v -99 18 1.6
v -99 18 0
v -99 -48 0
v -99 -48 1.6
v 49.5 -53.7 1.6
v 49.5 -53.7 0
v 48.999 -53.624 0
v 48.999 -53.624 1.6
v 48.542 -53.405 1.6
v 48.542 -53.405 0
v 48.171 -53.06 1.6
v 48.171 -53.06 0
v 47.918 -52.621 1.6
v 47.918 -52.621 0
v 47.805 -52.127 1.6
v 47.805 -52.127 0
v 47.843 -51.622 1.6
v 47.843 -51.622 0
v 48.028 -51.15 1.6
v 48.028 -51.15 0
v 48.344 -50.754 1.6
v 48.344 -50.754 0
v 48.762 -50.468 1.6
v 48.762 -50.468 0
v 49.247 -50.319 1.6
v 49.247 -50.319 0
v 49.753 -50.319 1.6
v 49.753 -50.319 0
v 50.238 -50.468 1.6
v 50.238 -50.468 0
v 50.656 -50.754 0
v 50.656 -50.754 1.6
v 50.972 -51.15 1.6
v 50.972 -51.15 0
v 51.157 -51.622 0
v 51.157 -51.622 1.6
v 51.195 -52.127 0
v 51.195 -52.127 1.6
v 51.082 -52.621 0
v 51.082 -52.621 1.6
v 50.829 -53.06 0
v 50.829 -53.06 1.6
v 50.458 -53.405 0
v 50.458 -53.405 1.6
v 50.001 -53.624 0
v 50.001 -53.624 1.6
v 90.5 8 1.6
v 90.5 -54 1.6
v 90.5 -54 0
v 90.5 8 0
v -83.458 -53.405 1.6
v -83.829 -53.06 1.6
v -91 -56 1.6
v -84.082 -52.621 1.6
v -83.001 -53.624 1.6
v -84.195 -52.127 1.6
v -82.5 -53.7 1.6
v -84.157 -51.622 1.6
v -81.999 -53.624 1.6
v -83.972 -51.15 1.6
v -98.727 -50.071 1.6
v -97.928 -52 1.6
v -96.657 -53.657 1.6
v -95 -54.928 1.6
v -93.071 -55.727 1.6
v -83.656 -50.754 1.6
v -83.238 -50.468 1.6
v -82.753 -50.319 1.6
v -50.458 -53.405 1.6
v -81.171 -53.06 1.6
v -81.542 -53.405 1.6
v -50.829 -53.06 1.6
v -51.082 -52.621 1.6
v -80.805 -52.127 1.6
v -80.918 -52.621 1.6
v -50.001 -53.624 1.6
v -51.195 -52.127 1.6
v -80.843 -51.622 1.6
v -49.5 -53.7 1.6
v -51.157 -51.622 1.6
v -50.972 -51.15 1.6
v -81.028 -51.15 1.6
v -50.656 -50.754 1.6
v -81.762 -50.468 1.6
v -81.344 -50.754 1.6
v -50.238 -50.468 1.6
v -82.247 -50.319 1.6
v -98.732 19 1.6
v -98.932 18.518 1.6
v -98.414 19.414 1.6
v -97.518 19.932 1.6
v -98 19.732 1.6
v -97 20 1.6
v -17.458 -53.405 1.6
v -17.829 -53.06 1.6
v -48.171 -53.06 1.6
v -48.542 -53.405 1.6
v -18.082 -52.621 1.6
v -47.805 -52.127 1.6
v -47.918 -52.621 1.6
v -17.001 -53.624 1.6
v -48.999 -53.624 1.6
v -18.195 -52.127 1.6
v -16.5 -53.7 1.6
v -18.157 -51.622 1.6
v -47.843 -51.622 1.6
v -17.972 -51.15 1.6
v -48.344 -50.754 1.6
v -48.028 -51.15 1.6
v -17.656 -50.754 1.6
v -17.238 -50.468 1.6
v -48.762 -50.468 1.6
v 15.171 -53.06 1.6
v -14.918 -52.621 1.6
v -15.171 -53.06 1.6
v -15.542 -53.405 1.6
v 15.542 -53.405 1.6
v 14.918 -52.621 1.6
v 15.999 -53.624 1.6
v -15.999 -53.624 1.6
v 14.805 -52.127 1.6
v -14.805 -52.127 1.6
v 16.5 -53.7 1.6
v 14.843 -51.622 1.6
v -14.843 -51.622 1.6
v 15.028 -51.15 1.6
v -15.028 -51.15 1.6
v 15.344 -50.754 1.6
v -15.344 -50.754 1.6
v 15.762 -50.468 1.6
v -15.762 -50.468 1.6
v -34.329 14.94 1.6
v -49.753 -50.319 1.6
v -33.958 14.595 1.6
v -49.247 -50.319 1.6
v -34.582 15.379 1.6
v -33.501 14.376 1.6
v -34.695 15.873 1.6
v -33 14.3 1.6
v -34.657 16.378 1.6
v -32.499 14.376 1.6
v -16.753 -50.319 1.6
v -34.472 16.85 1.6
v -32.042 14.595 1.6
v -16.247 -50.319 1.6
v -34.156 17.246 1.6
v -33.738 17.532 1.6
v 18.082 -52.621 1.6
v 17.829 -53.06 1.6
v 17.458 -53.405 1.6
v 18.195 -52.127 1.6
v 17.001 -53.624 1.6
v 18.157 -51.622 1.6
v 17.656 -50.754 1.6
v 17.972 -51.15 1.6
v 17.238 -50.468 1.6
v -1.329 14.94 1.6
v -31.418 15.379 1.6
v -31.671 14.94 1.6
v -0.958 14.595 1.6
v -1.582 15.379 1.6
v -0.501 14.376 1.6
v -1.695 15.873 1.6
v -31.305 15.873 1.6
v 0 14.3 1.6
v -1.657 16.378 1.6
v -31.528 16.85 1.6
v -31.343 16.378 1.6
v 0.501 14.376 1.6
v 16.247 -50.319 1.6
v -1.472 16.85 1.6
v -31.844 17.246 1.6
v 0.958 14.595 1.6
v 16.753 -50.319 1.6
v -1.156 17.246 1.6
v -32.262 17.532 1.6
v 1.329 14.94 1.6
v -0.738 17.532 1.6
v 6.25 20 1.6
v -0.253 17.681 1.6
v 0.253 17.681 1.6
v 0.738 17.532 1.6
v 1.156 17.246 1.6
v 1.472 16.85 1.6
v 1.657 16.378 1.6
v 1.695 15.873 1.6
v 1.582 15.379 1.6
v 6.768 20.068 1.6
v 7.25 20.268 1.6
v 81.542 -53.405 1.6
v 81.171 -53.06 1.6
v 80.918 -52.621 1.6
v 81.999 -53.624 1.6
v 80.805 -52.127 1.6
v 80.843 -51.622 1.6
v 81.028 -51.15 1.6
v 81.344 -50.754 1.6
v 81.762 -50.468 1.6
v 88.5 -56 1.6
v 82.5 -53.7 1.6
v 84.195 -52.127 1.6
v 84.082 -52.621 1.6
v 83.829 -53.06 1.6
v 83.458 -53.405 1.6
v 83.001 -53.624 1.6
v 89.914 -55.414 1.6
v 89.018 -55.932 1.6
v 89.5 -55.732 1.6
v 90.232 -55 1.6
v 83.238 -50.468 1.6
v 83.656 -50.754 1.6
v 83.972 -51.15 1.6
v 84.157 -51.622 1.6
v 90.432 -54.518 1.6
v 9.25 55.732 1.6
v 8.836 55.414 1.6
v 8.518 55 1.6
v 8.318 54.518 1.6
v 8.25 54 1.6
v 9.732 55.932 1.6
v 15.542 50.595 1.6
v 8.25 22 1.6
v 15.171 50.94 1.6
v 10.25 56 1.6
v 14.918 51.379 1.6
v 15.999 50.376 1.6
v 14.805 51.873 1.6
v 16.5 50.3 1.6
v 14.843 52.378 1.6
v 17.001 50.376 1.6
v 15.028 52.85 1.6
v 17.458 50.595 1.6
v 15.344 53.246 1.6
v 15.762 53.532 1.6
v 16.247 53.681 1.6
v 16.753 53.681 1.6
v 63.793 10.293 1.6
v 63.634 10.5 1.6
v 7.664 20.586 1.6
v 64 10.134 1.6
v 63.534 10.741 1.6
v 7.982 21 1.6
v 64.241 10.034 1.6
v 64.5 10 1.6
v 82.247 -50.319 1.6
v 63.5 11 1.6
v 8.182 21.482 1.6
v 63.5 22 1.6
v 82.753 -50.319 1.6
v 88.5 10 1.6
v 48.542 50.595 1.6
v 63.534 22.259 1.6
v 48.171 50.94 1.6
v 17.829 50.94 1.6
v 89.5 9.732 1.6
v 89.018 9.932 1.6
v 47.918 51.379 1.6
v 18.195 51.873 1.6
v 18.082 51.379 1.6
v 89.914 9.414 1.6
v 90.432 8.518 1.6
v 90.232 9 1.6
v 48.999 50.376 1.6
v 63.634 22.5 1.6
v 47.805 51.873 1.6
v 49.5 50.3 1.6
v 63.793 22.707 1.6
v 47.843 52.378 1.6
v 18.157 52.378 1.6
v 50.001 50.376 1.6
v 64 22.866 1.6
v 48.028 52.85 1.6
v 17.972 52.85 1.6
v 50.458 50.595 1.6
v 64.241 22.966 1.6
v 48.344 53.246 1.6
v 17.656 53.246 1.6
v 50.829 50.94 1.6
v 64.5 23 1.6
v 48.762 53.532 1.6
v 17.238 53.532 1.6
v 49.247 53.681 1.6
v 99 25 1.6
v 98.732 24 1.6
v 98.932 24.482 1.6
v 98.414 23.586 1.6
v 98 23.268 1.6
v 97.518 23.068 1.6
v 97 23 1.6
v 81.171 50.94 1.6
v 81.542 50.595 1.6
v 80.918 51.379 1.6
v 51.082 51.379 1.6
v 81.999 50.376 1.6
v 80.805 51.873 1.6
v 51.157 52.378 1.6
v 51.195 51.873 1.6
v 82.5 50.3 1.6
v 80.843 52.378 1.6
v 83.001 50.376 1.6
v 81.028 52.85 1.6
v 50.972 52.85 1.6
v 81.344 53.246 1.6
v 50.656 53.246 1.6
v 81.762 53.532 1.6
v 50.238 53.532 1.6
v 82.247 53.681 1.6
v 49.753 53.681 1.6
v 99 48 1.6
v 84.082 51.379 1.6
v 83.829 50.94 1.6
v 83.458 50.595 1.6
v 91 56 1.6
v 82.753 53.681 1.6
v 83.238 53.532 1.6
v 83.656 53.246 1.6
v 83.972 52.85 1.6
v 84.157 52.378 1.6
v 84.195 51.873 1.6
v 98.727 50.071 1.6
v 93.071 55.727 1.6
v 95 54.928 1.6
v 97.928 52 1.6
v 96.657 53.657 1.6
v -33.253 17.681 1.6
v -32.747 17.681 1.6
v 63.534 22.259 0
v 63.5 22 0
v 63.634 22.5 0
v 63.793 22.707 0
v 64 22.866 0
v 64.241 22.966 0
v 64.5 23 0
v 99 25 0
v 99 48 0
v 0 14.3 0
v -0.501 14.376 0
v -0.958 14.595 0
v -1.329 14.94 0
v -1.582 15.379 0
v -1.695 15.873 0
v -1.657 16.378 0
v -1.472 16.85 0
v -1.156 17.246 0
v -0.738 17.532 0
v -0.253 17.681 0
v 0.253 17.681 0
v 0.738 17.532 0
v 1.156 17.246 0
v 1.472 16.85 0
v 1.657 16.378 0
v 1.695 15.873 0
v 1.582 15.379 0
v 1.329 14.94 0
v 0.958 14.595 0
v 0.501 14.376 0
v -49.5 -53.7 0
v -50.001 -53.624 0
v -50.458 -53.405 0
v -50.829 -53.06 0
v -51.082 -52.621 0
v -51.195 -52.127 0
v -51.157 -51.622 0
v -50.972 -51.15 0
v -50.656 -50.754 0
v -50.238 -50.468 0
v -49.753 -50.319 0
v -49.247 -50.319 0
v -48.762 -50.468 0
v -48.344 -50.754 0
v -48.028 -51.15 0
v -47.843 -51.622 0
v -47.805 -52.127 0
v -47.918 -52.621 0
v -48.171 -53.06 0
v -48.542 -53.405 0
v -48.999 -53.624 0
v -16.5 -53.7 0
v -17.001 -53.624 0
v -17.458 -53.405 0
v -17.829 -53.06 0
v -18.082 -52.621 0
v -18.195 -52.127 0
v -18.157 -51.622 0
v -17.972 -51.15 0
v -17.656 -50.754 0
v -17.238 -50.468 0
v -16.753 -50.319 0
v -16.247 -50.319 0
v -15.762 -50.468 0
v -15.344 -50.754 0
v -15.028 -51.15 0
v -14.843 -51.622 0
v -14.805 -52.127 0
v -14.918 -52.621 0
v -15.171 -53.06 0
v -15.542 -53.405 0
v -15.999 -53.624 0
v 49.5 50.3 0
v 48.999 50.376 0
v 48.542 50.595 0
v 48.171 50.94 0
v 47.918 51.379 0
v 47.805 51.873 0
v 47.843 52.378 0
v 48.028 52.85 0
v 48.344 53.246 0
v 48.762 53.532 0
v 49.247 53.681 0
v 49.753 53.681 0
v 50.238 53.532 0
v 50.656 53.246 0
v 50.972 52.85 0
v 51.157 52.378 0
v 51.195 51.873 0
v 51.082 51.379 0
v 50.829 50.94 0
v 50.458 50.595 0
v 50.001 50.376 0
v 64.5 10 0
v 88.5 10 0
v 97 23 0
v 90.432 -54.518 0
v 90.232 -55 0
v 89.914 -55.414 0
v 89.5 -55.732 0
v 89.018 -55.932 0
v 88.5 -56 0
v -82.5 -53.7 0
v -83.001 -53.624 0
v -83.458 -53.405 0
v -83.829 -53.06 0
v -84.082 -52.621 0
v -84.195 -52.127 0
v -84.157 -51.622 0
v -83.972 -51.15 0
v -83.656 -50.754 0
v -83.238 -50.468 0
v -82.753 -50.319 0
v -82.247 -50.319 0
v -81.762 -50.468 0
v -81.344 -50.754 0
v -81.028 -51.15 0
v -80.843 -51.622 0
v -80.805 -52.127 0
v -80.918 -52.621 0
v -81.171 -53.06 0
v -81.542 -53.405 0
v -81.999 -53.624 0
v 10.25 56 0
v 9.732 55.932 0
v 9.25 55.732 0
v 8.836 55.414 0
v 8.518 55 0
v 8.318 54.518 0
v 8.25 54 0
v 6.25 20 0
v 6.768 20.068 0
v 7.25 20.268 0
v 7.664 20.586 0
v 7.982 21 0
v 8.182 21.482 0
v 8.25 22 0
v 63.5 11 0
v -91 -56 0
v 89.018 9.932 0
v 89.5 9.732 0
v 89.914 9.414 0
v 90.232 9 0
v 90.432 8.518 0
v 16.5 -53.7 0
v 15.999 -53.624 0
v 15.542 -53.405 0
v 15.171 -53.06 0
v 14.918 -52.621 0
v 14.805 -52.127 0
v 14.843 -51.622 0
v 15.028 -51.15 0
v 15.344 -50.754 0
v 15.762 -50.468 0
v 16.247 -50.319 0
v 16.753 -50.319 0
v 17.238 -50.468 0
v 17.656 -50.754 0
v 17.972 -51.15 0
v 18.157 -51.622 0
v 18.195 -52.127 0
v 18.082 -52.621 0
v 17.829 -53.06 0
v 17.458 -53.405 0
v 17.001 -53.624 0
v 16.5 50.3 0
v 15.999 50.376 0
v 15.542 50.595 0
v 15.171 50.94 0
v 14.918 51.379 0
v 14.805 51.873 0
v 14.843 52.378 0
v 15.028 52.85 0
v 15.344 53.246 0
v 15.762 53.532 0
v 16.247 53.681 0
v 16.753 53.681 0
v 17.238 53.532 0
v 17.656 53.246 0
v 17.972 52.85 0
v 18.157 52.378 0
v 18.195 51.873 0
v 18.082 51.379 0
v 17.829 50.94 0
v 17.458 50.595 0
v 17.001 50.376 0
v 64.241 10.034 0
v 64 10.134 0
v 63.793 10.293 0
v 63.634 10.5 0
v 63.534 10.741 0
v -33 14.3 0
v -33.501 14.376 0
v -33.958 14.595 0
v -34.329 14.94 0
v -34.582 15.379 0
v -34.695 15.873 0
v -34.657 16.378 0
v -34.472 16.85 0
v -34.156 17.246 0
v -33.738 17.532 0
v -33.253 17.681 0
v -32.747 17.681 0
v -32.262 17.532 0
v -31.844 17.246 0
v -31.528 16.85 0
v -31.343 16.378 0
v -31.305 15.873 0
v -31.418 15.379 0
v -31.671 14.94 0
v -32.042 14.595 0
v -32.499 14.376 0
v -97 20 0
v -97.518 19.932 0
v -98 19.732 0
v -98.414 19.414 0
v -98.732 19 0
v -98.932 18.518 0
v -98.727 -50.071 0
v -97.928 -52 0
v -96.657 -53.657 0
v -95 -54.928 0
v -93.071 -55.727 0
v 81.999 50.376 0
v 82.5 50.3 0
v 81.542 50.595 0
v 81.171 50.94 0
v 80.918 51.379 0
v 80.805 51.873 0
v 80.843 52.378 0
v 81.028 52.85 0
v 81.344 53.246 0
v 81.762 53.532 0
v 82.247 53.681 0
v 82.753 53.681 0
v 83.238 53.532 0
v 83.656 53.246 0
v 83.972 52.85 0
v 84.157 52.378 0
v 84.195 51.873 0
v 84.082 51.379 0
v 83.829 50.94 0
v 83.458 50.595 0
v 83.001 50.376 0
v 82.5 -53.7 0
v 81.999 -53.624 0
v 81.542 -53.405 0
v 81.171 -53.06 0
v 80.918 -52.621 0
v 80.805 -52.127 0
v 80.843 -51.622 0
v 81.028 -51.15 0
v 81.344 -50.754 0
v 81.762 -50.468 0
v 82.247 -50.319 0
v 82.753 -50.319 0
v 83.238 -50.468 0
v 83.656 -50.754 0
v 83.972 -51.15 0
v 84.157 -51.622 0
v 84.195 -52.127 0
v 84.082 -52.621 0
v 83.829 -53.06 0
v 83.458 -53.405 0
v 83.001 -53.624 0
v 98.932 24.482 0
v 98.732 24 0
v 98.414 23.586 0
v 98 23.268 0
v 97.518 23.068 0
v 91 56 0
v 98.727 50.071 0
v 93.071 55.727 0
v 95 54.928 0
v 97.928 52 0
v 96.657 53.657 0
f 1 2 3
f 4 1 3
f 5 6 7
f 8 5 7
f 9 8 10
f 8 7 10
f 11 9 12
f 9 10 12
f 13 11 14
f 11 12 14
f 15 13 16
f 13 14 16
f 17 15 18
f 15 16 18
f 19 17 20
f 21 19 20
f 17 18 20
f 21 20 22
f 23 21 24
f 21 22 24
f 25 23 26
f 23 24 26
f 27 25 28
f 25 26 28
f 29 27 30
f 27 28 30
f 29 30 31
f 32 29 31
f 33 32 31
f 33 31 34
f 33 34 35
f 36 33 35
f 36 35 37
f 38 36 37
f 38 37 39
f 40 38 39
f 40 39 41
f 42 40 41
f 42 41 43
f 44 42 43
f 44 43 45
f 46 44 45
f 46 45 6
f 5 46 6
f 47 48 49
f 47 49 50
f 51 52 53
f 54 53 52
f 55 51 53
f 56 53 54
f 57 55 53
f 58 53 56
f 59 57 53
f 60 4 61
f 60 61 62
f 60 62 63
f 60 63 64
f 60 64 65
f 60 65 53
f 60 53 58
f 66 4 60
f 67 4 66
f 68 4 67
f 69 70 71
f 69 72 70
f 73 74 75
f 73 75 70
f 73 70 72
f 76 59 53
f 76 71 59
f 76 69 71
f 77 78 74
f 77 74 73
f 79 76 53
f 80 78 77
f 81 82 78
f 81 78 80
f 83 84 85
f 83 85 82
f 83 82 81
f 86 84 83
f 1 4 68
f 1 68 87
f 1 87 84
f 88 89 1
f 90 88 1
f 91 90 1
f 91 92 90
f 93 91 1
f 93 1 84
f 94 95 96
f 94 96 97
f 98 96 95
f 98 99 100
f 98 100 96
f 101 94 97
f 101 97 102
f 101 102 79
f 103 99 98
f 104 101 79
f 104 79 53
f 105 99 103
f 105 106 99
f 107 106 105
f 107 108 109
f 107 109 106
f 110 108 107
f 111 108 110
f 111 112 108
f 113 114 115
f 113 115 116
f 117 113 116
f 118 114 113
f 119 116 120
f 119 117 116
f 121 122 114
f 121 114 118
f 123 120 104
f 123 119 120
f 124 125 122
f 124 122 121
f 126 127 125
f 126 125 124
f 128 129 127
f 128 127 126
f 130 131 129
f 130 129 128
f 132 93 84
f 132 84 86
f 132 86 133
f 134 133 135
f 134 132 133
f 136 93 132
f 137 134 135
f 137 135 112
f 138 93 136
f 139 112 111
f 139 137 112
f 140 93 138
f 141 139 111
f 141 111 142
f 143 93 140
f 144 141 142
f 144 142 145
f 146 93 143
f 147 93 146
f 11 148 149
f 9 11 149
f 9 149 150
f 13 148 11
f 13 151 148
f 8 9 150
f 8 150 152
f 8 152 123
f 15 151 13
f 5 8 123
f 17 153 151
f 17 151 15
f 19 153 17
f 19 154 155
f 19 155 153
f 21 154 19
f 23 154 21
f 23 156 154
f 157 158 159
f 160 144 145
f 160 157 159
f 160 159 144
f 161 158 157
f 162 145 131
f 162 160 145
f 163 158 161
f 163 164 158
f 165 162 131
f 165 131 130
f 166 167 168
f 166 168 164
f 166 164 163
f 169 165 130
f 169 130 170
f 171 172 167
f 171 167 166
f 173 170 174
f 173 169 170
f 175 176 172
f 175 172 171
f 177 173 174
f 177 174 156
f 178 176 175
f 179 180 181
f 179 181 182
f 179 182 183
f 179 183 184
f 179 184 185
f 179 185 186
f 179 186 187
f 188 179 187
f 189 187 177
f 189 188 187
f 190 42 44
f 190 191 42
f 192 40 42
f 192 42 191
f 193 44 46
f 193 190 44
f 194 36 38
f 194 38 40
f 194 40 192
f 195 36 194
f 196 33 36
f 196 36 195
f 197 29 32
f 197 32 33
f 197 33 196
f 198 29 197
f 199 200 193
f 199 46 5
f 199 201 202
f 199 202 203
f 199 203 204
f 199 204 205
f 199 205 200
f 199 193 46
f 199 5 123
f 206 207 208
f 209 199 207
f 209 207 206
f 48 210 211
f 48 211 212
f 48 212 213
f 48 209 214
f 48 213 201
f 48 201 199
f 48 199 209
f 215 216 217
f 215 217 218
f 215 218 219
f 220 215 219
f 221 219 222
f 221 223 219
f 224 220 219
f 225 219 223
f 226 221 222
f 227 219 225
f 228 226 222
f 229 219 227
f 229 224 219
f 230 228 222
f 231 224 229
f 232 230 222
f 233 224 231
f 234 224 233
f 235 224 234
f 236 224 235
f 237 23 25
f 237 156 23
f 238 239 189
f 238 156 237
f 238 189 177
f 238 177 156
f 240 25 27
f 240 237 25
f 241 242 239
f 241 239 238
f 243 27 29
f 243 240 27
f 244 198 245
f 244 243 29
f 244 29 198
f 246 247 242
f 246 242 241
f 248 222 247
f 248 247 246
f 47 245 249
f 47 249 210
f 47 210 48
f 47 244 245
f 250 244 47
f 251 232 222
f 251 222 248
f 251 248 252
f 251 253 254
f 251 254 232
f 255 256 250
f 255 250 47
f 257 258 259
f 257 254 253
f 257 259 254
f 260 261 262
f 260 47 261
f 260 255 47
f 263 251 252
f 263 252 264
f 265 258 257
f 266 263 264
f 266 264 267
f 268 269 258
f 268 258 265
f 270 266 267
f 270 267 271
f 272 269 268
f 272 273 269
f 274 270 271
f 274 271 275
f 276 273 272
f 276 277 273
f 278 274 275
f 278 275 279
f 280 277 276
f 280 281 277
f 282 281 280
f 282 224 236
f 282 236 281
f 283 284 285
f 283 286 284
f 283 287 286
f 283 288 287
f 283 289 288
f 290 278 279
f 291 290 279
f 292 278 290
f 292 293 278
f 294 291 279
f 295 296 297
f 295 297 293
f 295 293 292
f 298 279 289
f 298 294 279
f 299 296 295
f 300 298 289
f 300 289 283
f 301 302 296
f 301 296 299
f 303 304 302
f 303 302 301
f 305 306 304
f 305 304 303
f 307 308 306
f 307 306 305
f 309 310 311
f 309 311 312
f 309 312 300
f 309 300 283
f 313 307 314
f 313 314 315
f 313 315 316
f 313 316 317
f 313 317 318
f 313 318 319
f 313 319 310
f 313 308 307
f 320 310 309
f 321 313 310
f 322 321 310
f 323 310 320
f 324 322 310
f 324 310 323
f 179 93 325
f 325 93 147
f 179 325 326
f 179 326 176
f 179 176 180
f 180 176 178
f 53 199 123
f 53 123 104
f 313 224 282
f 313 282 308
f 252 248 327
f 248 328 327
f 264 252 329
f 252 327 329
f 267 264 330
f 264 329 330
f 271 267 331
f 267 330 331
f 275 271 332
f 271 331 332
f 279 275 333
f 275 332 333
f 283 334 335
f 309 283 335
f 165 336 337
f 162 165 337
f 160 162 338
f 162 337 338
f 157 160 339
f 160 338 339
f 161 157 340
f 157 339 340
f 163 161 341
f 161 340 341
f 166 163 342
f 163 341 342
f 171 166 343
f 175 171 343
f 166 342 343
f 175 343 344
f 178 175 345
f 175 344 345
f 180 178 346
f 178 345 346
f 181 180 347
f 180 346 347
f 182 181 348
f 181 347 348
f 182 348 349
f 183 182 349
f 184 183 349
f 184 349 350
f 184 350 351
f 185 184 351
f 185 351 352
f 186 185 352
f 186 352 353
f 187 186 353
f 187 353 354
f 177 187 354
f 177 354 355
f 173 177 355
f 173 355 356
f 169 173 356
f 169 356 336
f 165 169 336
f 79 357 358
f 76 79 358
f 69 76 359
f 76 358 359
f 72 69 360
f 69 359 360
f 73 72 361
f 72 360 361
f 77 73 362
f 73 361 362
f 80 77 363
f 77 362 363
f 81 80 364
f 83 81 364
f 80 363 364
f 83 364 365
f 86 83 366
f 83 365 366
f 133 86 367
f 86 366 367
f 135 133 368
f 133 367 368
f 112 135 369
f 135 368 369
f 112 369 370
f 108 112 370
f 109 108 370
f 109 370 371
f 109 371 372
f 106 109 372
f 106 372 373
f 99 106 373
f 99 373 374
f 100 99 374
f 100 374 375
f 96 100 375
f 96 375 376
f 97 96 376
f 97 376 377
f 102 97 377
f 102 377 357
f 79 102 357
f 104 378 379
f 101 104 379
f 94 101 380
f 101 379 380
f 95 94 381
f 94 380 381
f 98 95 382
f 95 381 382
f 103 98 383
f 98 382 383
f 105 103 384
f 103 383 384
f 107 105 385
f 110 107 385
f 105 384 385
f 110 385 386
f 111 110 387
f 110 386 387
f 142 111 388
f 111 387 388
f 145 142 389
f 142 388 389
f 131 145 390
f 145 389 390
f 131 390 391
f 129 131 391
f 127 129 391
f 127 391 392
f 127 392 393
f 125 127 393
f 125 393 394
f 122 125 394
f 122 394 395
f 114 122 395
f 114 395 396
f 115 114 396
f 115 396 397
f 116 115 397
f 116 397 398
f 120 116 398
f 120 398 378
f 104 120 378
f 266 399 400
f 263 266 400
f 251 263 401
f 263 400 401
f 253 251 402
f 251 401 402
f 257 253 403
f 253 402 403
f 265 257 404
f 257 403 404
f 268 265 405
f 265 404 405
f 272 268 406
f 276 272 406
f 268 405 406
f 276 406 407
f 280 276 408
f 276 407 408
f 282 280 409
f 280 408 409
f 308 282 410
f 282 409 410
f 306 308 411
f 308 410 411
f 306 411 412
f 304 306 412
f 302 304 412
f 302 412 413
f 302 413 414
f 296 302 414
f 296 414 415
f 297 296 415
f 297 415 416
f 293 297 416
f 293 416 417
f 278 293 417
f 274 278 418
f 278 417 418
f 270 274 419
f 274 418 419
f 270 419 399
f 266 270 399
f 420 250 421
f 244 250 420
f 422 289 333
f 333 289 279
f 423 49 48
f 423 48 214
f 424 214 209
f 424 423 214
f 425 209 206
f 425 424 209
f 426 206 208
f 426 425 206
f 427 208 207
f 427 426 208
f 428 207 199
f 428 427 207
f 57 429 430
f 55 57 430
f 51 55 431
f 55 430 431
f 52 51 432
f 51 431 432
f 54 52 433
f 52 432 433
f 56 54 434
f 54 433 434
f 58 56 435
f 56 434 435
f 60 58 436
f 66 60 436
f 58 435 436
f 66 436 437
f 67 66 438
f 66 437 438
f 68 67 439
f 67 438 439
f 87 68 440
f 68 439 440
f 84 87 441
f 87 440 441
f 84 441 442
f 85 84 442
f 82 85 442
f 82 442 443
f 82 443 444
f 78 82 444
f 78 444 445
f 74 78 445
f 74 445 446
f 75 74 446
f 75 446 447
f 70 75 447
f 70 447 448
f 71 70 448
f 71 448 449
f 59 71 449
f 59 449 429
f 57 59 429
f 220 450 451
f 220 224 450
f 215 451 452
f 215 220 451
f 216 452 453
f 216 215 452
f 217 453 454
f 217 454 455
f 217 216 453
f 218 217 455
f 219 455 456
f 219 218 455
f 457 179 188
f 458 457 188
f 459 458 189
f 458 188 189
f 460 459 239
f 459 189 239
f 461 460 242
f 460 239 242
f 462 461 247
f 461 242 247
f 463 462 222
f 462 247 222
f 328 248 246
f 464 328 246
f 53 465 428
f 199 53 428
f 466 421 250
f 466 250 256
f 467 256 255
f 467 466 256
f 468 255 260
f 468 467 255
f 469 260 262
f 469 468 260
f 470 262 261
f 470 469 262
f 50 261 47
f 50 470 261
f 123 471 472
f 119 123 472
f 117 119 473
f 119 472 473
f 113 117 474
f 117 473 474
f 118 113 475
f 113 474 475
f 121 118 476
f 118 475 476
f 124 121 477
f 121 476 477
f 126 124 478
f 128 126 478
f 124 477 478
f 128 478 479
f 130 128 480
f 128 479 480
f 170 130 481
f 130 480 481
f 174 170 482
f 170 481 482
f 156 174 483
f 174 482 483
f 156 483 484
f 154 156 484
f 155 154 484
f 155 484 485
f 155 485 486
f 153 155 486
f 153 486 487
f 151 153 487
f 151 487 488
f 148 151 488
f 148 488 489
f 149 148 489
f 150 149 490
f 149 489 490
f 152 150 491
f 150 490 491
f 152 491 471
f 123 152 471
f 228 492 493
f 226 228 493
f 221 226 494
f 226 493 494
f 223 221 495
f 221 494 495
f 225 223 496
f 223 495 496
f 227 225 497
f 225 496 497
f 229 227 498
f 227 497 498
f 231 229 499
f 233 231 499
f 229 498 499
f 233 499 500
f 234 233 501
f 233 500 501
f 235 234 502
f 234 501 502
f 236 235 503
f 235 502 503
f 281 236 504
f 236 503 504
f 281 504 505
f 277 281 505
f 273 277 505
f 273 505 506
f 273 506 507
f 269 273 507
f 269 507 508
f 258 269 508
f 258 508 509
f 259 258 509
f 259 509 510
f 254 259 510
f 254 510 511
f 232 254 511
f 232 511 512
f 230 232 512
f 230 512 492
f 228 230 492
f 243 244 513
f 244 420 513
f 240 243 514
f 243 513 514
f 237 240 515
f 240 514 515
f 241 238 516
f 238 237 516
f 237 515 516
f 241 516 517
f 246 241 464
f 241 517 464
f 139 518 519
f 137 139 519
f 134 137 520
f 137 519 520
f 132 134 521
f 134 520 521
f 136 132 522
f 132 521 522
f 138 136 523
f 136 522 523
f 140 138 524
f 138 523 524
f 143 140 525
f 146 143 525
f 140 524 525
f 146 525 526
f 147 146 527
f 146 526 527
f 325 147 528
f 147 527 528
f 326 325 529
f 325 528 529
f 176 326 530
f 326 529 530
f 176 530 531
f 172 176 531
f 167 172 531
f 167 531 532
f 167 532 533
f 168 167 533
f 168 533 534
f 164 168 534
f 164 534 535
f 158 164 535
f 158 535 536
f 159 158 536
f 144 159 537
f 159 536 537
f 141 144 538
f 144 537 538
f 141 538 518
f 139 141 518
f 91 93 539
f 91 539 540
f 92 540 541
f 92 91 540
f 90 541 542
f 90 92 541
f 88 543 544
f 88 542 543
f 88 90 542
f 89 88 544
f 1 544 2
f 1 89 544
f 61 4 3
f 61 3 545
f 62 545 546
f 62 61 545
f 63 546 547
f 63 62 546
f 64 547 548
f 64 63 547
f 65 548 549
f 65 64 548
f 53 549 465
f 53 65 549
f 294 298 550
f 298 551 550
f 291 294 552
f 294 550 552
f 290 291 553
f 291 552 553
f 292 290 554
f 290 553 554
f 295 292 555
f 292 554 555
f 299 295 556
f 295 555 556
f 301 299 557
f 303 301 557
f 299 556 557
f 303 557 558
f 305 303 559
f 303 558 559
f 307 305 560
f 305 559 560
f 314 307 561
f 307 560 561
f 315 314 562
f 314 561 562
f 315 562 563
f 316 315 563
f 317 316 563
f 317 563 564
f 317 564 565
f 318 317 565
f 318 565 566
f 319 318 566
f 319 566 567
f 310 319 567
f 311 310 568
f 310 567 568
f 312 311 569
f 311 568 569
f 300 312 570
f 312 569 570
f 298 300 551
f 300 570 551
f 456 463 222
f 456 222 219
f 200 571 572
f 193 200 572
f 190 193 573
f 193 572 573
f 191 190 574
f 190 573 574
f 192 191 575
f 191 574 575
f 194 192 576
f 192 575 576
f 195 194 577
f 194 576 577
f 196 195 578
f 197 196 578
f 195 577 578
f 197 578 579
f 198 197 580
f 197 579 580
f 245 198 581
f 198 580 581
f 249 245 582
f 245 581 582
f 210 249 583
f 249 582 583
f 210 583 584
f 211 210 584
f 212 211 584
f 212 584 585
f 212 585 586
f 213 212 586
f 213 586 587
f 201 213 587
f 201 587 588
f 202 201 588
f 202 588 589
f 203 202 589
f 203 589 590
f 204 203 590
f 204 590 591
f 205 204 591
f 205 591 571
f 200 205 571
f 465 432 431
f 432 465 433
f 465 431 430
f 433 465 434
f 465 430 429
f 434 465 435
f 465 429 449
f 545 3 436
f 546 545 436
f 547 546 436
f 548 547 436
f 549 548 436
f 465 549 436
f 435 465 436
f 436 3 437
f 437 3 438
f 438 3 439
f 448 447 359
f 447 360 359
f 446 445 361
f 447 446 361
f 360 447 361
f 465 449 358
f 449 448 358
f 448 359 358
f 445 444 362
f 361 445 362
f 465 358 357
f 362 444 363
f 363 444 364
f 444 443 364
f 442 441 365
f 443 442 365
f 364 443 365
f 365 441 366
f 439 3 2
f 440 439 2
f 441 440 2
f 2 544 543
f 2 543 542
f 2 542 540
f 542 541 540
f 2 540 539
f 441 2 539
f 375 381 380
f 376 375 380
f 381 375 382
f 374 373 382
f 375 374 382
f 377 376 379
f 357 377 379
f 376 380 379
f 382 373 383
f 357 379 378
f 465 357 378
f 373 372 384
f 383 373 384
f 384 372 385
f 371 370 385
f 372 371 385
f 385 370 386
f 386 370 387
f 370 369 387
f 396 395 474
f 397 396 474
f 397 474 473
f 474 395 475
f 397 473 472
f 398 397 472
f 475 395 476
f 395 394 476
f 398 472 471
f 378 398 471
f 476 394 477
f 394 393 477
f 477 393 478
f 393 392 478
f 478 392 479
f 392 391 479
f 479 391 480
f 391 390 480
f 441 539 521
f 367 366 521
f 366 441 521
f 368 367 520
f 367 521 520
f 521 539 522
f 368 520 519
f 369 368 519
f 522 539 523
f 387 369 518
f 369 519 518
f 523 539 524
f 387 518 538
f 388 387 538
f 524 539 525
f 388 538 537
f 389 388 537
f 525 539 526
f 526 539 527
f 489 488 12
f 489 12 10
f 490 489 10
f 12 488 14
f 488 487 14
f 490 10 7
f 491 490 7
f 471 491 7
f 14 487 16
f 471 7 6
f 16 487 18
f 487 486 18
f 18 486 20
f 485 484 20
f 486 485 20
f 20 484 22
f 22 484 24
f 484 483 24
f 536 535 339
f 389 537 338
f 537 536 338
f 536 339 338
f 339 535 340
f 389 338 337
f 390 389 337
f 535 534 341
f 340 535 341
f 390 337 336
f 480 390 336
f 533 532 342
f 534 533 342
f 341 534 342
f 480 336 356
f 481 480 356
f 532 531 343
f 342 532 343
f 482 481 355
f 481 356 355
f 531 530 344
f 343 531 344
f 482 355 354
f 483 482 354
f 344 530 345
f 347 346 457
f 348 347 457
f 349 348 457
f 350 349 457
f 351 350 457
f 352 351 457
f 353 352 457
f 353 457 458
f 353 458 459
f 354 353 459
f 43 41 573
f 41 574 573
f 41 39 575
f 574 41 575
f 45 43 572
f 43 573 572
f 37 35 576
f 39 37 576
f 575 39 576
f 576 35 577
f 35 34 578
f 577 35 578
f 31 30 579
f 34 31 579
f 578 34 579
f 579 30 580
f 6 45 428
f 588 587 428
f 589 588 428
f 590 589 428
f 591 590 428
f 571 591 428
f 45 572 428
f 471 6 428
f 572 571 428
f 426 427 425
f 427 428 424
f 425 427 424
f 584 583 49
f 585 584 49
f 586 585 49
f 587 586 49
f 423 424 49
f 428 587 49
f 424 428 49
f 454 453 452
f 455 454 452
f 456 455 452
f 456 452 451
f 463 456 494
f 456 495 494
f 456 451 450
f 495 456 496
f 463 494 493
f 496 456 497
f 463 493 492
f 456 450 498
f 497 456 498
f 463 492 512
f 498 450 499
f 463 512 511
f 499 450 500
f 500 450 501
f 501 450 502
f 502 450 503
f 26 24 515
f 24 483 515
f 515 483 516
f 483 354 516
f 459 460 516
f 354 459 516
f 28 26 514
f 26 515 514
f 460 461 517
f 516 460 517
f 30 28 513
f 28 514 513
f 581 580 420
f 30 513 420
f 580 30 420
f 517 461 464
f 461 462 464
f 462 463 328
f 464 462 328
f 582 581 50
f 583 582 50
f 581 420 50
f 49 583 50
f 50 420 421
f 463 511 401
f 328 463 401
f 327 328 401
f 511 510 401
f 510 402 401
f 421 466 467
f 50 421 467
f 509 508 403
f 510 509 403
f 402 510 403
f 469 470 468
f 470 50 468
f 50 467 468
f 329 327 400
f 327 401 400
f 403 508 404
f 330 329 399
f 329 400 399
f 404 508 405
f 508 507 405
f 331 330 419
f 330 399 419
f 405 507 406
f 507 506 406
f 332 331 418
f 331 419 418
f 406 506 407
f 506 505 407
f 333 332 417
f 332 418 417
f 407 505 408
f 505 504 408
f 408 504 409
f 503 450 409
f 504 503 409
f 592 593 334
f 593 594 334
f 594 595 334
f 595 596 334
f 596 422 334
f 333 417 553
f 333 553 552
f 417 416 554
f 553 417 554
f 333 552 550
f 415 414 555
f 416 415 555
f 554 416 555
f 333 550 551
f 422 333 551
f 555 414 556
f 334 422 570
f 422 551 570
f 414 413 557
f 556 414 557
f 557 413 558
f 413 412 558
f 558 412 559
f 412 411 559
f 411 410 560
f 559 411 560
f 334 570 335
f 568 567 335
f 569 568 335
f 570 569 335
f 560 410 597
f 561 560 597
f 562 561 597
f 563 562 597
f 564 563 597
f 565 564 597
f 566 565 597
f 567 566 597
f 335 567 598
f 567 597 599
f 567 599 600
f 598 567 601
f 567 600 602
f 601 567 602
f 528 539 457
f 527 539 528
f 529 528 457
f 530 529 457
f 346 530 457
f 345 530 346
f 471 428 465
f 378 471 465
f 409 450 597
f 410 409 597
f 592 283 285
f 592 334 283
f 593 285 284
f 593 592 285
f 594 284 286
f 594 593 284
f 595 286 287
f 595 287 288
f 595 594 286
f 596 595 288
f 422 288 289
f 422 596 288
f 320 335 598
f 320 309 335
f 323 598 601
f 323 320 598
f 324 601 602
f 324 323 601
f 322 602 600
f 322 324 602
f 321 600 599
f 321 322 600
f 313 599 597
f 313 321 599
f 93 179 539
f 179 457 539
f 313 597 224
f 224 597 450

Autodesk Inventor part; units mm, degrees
ref_plane "YZ Plane" through (0, 0, 0) normal (1, 0, 0) x (0, 1, 0)
ref_plane "XZ Plane" through (0, 0, 0) normal (0, 1, 0) x (-1, 0, 0)
ref_plane "XY Plane" through (0, 0, 0) normal (0, 0, 1) x (1, 0, 0)
sketch "Sketch1" plane through (0, 0, 0) normal (0, 0, 1) x (1, 0, 0)
  line L0 (-99, -56) -> (99, -56)
  line L1 (99, -56) -> (99, 56)
  line L2 (99, 56) -> (-99, 56)
  line L3 (-99, 56) -> (-99, -56)
  line L4 (-99, -56) -> (99, 56) construction
  line L5 (99, -56) -> (-99, 56) construction
  line L6 (-99, -56) -> (8.25, -56)
  line L7 (8.25, -56) -> (8.25, 20)
  line L8 (8.25, 20) -> (-99, 20)
  line L9 (-99, 20) -> (-99, -56)
  line L10 (8.25, 20) -> (8.25, 56)
  point P0 (0, 0)
  dimension "d0" = 112
  dimension "d1" = 198
  dimension "d3" = 76
  dimension "d50" = 8.25
extrude "Extrusion1" add sketch "Sketch1" along normal blind 1.6 contours L3 L8 L7 L0 | L7 L10 L2 L1 L0
sketch "Sketch2" plane through (0, 0, 1.6) normal (0, 0, 1) x (1, 0, 0)
  line L0 (-99, -56) -> (99, -56) projected
  line L1 (-99, 20) -> (-99, -56) projected
  line L2 (99, 56) -> (8.25, 56) projected
  line L3 (99, -56) -> (99, 56) projected
  line L4 (8.25, 20) -> (-99, 20) projected
  line L5 (-16.5, -52) -> (16.5, -52) construction
  line L6 (-49.5, -52) -> (-16.5, -52) construction
  point P0 (0, 0)
  point P1 (-82.5, -52)
  point P2 (49.5, -52)
  point P3 (-82.5, 52)
  point P4 (-49.5, 52)
  point P5 (-16.5, 52)
  point P6 (16.5, 52)
  point P7 (49.5, 52)
  point P8 (82.5, -52)
  point P9 (82.5, 52)
  point P10 (-33, 16)
  point P11 (0, 16)
  point P12 (0, -52)
  point P13 (-33, -52)
  point P14 (-99, 56)
  dimension "d6" = 4
  dimension "d9" = 33
  dimension "d12" = 104
  dimension "d15" = 4
  dimension "d17" = 16.5
  dimension "d18" = 16.5
  dimension "d26" = 4
hole "Hole1" at (-82.5, -52, 1.6) at (-49.5, -52, 1.6) at (-16.5, -52, 1.6) at (16.5, -52, 1.6) at (49.5, -52, 1.6) at (-82.5, 52, 1.6) at (-49.5, 52, 1.6) at (-16.5, 52, 1.6) at (16.5, 52, 1.6) at (49.5, 52, 1.6) at (82.5, -52, 1.6) at (82.5, 52, 1.6) at (-33, 16, 1.6) at (0, 16, 1.6) direction (0, 0, -1) diameter 3.4 end through all
sketch "Sketch3" plane through (0, 0, 1.6) normal (0, 0, 1) x (1, 0, 0)
  circle A0 centre (0, 16) radius 1.7 projected
  circle A1 centre (-33, 16) radius 1.7 projected
  circle A2 centre (82.5, 52) radius 1.7 projected
  circle A3 centre (82.5, -52) radius 1.7 projected
  circle A4 centre (49.5, 52) radius 1.7 projected
  circle A5 centre (16.5, 52) radius 1.7 projected
  circle A6 centre (49.5, -52) radius 1.7 projected
  circle A7 centre (16.5, -52) radius 1.7 projected
  circle A8 centre (-16.5, -52) radius 1.7 projected
  circle A9 centre (-49.5, -52) radius 1.7 projected
  circle A10 centre (-82.5, -52) radius 1.7 projected
  line L0 (99, 56) -> (8.25, 56) projected
  line L1 (-99, 20) -> (-99, -56) projected
  line L2 (-99, -56) -> (99, -56) projected
  line L3 (99, -56) -> (99, 56) projected
  line L4 (99, 23) -> (0, 23) construction
  line L5 (99, 10) -> (-99, 10) construction
  line L6 (90.5, -56) -> (90.5, 10)
  line L7 (99, 23) -> (80.5, 23)
  line L8 (80.5, 23) -> (80.5, 10)
  line L9 (90.5, 10) -> (80.5, 10)
  line L10 (63.5, 10) -> (80.5, 10)
  line L11 (80.5, 10) -> (80.5, 23)
  line L12 (80.5, 23) -> (63.5, 23)
  line L13 (63.5, 23) -> (63.5, 10)
  line L14 (63.5, 10) -> (80.5, 23) construction
  line L15 (80.5, 10) -> (63.5, 23) construction
  line L16 (8.25, 56) -> (8.25, 20) projected
  line L17 (8.25, 20) -> (-99, 20) projected
  point P0 (0, 0)
  point P1 (82.5, 27)
  point P2 (72, 16.5)
  dimension "d29" = 4
  dimension "d30" = 8
  dimension "d31" = 4
  dimension "d32" = 4
  dimension "d33" = 2
  dimension "d36" = 72.5
  dimension "d37" = 17
  dimension "d38" = 13
extrude "Extrusion2" cut sketch "Sketch3" against normal through all contours L3 L2 L6 L9 L8 L7 | L8 L10 L13 L12
fillet "Fillet1" radius 8 2 edges at (-99, -56, 0.8) (99, 56, 0.8)
fillet "Fillet2" radius 2 6 edges at (90.5, 10, 0.8) (8.25, 20, 0.8) (-99, 20, 0.8) (8.25, 56, 0.8) (90.5, -56, 0.8) (99, 23, 0.8)
fillet "Fillet3" radius 1 2 edges at (63.5, 23, 0.8) (63.5, 10, 0.8)
sketch "Sketch5" plane through (0, 0, 1.6) normal (0, 0, 1) x (1, 0, 0)
  circle A0 centre (0, 16) radius 1.7 projected
  circle A1 centre (-33, 16) radius 1.7 projected
  circle A2 centre (82.5, 52) radius 1.7 projected
  circle A3 centre (82.5, -52) radius 1.7 projected
  circle A4 centre (49.5, 52) radius 1.7 projected
  circle A5 centre (16.5, 52) radius 1.7 projected
  circle A6 centre (49.5, -52) radius 1.7 projected
  circle A7 centre (16.5, -52) radius 1.7 projected
  circle A8 centre (-16.5, -52) radius 1.7 projected
  circle A9 centre (-49.5, -52) radius 1.7 projected
  circle A10 centre (-82.5, -52) radius 1.7 projected
  arc A11 (88.5, -56) -> (90.5, -54) centre (88.5, -54) ccw projected
  line L0 (90.5, -54) -> (90.5, 8) projected
  arc A12 (90.5, 8) -> (88.5, 10) centre (88.5, 8) ccw projected
  line L1 (88.5, 10) -> (64.5, 10) projected
  arc A13 (63.5, 11) -> (64.5, 10) centre (64.5, 11) ccw projected
  line L2 (63.5, 11) -> (63.5, 22) projected
  arc A14 (64.5, 23) -> (63.5, 22) centre (64.5, 22) ccw projected
  line L3 (64.5, 23) -> (97, 23) projected
  line L4 (99, 25) -> (99, 48) projected
  arc A15 (99, 48) -> (91, 56) centre (91, 48) ccw projected
  line L5 (91, 56) -> (10.25, 56) projected
  arc A16 (10.25, 56) -> (8.25, 54) centre (10.25, 54) ccw projected
  line L6 (8.25, 54) -> (8.25, 22) projected
  arc A17 (6.25, 20) -> (8.25, 22) centre (6.25, 22) ccw projected
  line L7 (6.25, 20) -> (-97, 20) projected
  arc A18 (-97, 20) -> (-99, 18) centre (-97, 18) ccw projected
  line L8 (-99, 18) -> (-99, -48) projected
  arc A19 (-99, -48) -> (-91, -56) centre (-91, -48) ccw projected
  line L9 (-91, -56) -> (88.5, -56) projected
  arc A20 (97, 23) -> (99, 25) centre (97, 25) ccw projected
  point P0 (0, 0)
equation "\"d15\" = d6"
equation "\"d18\" = d17"
equation "\"d31\" = d32"
properties part number "Class-D RevA Board Outline"
